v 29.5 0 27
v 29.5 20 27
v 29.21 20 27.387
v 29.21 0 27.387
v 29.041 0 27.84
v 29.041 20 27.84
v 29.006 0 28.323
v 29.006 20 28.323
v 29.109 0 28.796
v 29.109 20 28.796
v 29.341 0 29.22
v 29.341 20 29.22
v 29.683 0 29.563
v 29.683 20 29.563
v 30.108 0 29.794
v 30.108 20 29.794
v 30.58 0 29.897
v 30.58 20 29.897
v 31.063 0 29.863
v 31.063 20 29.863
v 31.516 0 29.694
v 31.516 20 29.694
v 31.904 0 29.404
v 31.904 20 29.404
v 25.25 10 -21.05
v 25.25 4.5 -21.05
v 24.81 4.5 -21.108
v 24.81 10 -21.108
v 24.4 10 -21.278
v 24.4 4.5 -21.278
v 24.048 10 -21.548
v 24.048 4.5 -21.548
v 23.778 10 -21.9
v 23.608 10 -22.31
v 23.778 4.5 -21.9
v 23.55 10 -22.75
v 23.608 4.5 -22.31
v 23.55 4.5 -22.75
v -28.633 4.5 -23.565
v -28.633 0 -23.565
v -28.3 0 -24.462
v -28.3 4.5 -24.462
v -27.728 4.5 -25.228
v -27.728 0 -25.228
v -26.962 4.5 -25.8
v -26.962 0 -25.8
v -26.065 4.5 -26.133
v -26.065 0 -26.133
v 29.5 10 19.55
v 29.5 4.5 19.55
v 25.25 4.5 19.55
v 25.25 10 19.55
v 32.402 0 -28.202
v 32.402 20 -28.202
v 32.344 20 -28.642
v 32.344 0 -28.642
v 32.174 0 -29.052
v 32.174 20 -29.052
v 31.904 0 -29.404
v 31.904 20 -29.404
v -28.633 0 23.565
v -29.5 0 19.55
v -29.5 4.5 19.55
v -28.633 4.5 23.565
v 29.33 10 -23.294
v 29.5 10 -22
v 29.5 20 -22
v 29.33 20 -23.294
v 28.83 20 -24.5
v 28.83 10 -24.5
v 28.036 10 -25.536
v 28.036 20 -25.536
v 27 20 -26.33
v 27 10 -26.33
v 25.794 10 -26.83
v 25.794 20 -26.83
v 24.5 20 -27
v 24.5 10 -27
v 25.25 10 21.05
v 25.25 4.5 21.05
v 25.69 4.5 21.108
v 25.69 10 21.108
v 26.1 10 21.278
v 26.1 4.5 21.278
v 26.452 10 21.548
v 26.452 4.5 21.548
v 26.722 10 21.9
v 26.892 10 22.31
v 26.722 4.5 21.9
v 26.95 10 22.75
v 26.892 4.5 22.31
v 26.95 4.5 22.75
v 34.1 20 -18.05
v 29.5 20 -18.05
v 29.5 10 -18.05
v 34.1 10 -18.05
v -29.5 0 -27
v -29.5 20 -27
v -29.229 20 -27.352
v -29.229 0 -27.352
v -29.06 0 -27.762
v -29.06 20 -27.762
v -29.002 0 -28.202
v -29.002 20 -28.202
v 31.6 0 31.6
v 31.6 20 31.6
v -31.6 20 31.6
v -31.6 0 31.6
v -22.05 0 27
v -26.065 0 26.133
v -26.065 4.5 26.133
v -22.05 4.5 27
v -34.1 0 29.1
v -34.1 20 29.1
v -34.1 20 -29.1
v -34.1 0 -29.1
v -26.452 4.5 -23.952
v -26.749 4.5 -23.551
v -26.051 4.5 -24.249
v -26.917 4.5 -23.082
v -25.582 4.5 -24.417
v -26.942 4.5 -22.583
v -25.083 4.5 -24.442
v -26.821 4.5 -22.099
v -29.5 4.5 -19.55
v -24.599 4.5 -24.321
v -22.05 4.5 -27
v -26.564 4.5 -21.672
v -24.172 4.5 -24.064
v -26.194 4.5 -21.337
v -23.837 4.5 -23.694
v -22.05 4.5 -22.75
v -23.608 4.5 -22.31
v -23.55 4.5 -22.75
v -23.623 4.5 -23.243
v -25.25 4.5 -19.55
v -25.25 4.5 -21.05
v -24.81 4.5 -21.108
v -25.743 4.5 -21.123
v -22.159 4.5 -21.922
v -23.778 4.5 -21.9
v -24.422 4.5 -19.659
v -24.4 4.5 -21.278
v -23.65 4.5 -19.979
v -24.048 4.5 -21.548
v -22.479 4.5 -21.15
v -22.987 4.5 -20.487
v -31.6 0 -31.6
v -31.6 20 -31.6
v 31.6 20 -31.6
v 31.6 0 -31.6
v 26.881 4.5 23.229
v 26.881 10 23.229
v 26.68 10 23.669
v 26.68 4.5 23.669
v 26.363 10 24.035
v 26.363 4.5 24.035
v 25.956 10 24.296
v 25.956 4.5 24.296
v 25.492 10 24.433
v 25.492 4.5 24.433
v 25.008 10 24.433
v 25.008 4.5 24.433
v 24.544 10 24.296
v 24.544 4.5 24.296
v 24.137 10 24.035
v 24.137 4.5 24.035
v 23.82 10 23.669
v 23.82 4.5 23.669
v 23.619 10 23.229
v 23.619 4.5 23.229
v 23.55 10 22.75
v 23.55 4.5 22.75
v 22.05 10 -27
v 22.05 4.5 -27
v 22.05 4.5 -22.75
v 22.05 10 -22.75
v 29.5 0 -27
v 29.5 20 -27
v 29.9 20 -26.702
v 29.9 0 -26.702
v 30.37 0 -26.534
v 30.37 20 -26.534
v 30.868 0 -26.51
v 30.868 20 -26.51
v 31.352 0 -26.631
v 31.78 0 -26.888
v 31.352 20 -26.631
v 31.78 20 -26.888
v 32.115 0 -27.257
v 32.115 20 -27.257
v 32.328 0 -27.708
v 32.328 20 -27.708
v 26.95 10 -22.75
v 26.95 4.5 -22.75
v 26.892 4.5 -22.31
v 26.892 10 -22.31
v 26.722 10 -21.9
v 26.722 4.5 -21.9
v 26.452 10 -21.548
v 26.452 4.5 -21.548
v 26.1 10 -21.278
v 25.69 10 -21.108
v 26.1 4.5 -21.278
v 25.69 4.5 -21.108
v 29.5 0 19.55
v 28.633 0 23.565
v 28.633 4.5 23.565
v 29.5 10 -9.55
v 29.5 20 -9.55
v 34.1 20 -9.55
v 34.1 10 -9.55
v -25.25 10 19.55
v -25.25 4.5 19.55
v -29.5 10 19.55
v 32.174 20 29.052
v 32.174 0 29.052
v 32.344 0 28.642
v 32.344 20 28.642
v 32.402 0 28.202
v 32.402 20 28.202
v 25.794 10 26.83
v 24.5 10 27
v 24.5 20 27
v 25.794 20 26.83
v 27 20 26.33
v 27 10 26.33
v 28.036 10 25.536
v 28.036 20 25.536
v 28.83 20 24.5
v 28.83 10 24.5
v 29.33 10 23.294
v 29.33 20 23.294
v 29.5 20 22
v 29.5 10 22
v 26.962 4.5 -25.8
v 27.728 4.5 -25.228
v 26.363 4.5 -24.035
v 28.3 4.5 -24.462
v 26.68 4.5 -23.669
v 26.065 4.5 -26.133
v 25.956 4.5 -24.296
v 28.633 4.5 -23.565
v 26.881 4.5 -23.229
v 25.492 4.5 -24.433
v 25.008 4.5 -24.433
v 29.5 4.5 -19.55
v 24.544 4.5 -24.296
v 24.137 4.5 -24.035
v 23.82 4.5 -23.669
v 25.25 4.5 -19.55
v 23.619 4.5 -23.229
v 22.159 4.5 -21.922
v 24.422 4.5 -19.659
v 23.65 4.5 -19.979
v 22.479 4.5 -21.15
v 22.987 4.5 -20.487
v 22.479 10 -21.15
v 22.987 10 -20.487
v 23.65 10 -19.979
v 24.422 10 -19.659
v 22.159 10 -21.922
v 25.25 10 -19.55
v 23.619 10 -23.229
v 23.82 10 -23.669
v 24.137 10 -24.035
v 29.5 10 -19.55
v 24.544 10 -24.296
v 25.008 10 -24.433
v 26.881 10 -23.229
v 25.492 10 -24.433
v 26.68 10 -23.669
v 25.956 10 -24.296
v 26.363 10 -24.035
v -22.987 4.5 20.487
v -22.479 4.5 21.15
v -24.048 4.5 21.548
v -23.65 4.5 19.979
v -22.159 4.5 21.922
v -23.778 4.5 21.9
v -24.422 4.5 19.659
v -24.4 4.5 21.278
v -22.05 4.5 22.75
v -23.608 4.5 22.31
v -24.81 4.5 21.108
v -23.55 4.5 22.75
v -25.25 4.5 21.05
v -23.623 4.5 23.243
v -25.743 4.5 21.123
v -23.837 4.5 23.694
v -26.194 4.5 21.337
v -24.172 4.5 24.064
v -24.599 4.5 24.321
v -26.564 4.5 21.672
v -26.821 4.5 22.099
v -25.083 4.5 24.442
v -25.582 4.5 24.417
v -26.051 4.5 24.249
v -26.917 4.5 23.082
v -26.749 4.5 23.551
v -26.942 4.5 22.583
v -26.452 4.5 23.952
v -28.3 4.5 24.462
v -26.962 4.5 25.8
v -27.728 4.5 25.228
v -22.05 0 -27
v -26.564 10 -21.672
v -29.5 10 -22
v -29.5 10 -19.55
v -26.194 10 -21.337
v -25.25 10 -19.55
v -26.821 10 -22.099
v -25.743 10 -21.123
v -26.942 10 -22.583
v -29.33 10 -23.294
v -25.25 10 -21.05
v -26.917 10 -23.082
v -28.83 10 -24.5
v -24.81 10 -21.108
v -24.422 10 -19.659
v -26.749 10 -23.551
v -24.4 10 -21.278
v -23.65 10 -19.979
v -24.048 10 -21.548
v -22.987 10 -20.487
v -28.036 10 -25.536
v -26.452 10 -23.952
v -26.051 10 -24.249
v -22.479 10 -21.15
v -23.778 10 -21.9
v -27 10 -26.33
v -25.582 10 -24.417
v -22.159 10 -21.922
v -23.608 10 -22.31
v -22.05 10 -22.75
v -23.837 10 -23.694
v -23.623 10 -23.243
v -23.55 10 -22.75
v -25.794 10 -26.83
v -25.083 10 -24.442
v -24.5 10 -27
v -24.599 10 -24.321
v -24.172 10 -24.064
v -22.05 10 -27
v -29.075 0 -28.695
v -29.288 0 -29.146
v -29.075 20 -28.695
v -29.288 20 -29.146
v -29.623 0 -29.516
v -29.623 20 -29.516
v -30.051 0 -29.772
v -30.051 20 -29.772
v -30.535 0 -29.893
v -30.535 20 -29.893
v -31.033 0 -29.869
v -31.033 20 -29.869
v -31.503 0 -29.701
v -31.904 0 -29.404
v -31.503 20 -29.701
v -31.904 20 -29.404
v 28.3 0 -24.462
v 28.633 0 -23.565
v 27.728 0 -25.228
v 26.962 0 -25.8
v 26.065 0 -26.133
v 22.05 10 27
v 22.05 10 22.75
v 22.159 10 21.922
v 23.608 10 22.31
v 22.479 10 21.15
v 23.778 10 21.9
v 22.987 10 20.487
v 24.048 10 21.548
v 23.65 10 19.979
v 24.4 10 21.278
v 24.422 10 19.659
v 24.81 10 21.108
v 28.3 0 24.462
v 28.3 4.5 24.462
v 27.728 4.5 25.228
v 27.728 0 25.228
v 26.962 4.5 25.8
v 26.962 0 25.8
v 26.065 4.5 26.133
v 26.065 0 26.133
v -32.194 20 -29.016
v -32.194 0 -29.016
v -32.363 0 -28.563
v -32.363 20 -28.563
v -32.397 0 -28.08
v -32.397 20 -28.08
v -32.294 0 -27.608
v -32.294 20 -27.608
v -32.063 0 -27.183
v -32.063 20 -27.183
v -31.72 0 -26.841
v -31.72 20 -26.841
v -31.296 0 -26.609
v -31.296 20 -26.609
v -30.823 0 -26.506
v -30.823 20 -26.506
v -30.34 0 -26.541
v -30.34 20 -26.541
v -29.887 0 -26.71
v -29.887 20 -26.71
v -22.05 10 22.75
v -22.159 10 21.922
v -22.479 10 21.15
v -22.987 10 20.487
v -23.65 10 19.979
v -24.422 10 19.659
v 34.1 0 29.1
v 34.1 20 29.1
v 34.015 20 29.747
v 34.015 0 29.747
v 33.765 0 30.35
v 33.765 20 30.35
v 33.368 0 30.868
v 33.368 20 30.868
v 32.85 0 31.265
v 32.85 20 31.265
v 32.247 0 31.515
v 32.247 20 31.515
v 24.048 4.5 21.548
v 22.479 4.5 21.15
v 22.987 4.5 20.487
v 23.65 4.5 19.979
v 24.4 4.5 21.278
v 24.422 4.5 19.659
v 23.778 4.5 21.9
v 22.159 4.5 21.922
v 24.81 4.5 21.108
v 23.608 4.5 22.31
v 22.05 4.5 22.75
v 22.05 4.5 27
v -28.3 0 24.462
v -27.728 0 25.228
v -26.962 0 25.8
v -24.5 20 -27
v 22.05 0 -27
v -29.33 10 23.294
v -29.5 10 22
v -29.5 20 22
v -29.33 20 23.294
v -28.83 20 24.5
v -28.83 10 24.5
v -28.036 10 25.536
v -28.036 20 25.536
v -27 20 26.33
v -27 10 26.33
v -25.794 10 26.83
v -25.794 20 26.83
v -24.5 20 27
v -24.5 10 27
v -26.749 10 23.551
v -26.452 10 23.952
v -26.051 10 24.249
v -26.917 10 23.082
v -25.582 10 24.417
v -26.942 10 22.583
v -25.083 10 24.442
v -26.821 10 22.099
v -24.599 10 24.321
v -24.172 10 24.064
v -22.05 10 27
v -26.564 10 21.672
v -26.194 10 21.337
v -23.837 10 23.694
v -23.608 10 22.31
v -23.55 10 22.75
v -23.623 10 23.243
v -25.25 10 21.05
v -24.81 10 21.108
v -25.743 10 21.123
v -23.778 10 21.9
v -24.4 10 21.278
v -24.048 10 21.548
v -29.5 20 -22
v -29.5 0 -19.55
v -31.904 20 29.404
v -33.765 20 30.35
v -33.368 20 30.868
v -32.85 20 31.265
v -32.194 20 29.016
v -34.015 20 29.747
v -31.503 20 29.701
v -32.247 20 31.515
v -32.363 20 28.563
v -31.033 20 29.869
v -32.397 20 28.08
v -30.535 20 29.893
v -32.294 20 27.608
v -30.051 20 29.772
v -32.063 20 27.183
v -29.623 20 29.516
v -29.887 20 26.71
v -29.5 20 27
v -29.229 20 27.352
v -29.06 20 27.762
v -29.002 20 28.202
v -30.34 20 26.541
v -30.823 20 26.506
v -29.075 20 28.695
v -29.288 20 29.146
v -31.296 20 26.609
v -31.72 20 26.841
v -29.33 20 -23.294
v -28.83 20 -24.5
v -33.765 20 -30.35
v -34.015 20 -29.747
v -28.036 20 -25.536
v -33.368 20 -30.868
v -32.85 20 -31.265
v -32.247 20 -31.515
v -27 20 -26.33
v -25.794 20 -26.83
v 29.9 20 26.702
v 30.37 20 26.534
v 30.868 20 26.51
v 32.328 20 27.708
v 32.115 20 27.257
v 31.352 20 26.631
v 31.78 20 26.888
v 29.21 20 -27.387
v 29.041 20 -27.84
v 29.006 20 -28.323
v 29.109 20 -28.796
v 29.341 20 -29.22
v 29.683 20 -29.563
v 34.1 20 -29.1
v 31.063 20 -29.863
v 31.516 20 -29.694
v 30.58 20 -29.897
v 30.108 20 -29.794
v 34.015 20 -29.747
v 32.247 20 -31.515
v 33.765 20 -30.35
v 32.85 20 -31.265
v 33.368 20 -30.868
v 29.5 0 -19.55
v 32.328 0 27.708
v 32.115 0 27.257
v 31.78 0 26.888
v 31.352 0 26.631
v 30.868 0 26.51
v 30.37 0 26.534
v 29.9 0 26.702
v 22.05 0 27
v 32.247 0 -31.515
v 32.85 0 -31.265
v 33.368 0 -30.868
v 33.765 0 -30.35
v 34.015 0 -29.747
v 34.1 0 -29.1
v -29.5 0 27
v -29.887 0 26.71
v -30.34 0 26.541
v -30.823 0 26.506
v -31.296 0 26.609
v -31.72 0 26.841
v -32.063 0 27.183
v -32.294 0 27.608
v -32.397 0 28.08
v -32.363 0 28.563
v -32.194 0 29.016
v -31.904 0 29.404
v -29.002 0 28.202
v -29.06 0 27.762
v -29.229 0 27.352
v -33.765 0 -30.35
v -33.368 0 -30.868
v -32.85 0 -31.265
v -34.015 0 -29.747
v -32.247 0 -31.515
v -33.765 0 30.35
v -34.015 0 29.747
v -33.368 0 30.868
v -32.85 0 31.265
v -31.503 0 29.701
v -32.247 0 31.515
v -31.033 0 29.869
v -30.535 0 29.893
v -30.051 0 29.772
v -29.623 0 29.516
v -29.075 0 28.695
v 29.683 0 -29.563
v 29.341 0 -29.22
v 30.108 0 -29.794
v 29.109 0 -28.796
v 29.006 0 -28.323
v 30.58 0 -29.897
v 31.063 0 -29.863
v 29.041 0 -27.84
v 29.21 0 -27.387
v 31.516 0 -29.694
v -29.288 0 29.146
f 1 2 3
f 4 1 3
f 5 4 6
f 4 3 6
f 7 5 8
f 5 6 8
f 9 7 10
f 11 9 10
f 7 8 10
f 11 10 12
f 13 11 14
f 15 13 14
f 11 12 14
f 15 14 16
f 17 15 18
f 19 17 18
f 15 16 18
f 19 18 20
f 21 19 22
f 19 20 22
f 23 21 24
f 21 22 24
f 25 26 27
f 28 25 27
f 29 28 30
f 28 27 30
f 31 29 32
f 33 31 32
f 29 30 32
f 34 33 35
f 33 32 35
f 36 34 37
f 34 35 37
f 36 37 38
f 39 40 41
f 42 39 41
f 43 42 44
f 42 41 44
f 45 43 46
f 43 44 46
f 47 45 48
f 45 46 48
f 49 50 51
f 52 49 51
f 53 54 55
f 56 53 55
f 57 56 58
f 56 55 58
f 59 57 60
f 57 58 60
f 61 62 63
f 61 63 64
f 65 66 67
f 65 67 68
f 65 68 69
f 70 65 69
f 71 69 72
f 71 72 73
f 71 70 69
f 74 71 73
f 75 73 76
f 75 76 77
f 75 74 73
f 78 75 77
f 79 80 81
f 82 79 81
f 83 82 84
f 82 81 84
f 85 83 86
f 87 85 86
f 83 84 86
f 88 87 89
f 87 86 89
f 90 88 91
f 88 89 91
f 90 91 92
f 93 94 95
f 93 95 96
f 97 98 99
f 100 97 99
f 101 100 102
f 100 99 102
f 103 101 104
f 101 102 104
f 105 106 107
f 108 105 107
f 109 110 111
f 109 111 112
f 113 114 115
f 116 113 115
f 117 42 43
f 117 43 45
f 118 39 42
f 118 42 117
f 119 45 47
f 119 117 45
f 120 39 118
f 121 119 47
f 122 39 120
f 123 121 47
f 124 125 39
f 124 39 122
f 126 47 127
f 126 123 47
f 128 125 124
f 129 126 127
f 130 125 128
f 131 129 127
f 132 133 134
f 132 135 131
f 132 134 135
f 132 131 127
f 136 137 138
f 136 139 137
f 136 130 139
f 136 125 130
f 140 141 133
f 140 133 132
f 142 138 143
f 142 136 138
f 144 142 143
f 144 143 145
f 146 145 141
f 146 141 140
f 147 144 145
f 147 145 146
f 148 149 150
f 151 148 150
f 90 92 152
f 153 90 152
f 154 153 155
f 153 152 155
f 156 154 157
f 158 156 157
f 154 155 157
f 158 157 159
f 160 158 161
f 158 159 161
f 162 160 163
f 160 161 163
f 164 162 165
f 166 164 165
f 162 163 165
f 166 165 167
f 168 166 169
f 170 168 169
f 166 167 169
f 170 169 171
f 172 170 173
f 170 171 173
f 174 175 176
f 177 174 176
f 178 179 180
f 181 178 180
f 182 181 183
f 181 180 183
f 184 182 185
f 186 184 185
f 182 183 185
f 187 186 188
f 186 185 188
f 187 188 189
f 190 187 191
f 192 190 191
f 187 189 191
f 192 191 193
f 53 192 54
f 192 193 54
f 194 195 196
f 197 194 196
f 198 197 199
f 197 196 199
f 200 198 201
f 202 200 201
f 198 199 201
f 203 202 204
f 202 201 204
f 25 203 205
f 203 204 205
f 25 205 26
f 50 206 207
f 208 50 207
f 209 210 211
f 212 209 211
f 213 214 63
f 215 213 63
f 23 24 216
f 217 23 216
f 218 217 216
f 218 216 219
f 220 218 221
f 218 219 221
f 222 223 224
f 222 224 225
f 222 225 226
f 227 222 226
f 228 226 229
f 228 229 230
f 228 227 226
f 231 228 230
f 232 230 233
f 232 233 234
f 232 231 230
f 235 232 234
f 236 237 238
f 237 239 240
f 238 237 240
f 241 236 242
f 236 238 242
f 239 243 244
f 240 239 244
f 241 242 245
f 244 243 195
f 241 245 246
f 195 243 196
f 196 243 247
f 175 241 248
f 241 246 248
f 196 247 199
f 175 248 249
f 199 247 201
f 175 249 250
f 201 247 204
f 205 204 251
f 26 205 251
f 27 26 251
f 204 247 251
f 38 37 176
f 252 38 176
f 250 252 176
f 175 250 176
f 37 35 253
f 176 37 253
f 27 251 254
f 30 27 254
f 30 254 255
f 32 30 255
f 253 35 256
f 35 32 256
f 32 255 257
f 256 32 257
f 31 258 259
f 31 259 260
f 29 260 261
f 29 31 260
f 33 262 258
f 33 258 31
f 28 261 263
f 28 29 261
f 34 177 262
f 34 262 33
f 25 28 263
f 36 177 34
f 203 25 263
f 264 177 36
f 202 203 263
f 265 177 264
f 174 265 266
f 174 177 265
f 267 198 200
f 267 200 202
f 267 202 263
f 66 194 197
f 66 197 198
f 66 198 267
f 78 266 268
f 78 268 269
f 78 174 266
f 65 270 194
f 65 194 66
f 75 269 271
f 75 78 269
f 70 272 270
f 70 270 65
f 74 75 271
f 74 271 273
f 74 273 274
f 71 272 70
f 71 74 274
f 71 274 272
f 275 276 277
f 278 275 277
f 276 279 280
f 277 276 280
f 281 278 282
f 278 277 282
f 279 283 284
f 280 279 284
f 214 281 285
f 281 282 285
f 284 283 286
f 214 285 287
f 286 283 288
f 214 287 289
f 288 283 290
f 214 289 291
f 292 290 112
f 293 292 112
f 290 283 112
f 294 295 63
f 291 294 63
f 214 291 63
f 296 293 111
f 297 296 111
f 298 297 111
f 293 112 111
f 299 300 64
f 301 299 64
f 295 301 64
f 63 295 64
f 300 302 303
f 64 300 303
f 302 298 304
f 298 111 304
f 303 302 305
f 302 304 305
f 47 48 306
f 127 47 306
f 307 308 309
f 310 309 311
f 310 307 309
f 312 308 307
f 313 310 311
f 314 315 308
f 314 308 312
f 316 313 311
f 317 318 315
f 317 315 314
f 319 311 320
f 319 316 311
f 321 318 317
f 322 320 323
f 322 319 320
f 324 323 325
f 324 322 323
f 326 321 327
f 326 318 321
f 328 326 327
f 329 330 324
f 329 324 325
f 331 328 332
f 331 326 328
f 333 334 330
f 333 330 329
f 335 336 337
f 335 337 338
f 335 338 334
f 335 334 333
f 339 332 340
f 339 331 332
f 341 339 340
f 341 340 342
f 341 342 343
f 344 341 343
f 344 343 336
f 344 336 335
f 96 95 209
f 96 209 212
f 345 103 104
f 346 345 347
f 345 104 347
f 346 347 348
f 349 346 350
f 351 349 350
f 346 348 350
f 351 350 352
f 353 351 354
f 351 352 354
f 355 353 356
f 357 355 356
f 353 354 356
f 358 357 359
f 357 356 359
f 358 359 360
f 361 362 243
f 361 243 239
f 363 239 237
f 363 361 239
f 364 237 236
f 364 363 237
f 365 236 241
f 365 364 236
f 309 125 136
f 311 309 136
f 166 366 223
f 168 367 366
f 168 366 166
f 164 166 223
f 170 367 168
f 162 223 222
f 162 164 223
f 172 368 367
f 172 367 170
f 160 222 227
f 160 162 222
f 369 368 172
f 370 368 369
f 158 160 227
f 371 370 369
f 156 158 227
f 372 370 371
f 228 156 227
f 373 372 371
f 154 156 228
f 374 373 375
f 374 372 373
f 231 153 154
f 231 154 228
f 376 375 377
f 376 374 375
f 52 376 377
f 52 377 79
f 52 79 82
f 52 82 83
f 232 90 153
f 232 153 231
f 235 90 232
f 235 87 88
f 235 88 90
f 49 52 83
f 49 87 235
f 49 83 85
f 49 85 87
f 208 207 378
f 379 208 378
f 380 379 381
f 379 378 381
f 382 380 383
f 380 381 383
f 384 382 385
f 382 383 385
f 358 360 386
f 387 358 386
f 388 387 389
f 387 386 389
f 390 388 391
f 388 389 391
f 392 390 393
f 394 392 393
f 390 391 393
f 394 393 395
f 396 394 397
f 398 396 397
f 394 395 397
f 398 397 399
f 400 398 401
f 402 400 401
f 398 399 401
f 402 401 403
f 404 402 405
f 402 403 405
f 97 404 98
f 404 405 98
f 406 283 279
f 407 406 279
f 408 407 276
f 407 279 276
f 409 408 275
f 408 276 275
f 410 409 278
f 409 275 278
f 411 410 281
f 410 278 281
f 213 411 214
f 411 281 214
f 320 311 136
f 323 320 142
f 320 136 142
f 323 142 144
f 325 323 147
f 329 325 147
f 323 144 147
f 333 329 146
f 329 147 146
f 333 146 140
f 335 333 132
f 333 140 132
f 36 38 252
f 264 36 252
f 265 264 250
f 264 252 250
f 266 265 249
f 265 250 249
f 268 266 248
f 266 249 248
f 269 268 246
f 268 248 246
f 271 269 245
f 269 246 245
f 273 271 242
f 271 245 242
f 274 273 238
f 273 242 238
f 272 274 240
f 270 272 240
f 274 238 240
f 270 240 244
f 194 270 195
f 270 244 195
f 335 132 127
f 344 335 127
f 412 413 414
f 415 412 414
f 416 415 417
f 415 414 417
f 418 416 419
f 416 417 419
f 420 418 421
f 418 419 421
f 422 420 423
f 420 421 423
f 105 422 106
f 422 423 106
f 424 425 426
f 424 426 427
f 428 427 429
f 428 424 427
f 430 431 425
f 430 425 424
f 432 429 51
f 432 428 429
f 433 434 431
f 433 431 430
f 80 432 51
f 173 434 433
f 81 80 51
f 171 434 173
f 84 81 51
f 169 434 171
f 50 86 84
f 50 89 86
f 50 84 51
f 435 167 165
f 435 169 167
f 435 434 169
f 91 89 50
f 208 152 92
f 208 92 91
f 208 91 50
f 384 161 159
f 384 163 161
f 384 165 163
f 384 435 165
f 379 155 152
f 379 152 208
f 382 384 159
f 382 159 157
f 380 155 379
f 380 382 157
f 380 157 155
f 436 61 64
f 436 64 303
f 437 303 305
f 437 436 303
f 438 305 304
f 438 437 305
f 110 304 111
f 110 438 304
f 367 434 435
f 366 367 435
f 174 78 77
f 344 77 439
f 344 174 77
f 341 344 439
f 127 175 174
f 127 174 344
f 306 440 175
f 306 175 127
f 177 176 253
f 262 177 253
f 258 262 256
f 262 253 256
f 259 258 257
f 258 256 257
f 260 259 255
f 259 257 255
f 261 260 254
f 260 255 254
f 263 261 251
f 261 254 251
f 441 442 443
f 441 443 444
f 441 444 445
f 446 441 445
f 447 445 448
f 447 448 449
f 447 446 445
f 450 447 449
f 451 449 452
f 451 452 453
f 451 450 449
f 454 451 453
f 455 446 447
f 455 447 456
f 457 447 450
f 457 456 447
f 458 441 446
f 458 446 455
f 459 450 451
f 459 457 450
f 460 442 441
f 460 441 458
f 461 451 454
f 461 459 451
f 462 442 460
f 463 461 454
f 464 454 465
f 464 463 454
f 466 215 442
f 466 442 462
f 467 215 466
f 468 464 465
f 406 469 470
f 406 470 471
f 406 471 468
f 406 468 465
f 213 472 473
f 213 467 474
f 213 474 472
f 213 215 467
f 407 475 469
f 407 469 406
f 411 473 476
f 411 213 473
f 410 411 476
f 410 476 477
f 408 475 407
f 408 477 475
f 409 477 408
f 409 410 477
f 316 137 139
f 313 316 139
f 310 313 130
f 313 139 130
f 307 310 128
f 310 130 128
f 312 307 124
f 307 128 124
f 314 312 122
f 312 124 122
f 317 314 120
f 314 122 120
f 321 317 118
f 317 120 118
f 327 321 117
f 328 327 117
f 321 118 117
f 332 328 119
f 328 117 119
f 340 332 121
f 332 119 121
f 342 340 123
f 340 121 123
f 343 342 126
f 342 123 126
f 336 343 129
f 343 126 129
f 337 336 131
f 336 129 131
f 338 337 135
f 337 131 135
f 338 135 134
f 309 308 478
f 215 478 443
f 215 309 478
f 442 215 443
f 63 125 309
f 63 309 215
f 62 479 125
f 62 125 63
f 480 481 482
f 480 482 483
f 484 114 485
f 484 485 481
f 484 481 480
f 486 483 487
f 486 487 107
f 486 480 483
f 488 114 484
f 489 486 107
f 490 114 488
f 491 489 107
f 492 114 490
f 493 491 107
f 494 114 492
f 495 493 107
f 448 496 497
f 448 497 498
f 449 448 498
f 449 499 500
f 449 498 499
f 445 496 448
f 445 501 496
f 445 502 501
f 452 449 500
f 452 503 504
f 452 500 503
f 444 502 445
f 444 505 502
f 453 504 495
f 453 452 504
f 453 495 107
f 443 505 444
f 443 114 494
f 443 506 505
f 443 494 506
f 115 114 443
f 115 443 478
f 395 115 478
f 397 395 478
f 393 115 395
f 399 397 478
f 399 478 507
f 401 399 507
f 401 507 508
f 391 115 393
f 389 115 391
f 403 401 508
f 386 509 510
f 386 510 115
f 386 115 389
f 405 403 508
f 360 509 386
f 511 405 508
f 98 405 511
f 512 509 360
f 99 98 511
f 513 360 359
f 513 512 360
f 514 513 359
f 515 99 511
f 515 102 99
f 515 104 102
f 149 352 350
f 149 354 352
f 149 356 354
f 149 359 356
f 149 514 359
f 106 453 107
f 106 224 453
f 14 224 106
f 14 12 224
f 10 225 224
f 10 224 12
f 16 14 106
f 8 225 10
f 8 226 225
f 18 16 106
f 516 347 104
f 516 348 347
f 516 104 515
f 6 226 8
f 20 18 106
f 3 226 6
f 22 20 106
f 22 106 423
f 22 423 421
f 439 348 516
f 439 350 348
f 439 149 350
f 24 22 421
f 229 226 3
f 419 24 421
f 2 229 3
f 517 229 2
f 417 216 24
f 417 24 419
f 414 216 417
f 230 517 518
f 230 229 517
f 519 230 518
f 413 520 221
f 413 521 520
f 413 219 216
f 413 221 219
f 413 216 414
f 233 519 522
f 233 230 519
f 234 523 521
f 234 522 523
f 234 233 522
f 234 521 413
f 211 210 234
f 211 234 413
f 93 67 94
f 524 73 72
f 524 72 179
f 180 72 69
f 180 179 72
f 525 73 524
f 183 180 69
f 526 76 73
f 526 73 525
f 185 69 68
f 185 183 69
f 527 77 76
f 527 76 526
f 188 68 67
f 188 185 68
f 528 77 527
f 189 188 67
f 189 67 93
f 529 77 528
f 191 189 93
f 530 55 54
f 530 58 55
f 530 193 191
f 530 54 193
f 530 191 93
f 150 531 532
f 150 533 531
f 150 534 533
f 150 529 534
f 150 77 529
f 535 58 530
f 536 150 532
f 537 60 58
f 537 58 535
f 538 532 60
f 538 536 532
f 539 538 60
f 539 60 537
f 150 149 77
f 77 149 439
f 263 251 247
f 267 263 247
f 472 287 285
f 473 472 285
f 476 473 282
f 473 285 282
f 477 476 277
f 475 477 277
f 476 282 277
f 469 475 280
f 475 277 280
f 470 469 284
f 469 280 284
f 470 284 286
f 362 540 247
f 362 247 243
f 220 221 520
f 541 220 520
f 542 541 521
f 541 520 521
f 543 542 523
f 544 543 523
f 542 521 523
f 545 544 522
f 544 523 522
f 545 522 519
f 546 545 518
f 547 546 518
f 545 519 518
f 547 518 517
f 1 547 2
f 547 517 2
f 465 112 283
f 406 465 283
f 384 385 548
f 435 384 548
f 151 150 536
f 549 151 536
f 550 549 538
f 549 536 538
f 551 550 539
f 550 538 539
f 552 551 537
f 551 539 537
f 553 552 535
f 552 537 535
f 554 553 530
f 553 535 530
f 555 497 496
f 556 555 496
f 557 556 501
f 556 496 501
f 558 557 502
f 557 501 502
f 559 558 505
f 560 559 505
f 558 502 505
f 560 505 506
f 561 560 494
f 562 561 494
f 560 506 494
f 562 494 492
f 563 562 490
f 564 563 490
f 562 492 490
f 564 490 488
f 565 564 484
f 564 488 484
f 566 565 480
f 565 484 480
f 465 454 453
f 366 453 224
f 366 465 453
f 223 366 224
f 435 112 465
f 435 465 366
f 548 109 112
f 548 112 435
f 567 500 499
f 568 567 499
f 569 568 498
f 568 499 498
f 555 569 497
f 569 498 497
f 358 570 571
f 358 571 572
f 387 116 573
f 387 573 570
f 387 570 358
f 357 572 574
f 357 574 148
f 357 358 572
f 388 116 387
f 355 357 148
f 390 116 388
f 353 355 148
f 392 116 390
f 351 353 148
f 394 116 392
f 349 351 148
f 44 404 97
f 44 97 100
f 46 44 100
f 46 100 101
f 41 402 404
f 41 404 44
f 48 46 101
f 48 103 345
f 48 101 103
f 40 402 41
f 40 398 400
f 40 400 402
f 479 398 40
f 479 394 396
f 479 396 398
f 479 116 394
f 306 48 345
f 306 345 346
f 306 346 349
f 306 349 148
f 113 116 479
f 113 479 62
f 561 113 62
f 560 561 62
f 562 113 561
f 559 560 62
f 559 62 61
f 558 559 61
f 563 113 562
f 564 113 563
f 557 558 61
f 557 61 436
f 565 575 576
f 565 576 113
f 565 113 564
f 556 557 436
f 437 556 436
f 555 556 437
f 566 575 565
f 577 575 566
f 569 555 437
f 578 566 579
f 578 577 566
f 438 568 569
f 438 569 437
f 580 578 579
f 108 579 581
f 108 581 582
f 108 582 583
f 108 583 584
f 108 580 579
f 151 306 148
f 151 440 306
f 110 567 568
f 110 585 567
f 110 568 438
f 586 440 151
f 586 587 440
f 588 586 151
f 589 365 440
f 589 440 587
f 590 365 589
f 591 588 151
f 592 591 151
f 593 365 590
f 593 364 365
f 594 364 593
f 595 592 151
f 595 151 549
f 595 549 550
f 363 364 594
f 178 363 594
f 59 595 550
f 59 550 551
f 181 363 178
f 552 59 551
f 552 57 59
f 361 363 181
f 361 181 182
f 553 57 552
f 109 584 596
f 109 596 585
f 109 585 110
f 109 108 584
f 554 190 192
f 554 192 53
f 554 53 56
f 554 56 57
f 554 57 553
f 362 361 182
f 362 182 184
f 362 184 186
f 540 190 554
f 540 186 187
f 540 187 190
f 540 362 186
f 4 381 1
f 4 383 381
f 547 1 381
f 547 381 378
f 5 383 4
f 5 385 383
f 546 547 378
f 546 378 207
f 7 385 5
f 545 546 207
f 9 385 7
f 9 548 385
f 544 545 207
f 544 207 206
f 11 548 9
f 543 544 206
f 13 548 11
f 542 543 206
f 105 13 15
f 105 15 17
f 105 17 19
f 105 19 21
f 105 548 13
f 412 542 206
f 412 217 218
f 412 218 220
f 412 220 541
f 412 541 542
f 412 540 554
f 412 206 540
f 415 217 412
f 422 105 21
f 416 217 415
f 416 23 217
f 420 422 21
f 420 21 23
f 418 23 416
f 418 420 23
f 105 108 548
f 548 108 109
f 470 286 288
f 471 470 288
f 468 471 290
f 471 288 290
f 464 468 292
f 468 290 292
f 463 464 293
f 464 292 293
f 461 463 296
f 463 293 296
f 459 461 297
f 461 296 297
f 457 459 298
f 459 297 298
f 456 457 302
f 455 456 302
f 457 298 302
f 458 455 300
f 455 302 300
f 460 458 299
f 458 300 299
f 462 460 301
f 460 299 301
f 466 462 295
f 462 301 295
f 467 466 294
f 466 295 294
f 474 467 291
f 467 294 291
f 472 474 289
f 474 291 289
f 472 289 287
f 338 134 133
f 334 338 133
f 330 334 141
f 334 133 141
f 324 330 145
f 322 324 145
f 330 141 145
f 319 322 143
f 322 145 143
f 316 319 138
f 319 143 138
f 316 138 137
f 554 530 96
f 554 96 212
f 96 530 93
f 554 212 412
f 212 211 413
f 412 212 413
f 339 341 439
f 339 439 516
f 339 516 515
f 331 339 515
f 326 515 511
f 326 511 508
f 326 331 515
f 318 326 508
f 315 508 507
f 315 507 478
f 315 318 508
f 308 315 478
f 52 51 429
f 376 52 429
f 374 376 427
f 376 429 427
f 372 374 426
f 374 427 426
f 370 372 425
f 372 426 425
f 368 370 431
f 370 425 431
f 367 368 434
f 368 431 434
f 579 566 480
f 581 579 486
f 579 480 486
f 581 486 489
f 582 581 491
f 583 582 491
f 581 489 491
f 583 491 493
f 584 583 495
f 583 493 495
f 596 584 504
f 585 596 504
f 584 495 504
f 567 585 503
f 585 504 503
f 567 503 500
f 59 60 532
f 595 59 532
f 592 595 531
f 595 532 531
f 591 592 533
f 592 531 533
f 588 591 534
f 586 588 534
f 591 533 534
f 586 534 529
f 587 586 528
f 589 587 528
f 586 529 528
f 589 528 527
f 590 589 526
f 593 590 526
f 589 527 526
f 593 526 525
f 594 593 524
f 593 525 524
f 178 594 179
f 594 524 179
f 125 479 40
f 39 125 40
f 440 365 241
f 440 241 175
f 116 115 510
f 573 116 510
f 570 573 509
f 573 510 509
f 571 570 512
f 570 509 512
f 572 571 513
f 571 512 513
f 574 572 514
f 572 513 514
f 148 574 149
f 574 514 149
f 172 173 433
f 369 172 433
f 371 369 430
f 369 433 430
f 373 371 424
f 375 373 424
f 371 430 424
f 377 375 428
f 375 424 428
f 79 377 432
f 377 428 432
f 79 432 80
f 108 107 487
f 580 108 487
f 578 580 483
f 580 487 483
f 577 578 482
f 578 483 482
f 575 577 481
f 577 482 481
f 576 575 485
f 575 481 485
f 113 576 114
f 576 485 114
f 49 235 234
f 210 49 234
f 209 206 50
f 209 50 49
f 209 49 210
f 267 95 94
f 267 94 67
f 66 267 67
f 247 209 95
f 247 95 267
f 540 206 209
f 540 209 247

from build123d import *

# Parameters (mm, degrees)
EXTRUDE_2_DEPTH     = 20
EXTRUDE_3_DEPTH     = 4
EXTRUDE_4_DEPTH     = 10
CUT_EXTRUDE_1_DEPTH = 25
SKETCH_5_W          = 4.6
SKETCH_5_H          = 8.5
CUT_EXTRUDE_2_DEPTH = 10
CUT_EXTRUDE_3_DEPTH = 4
SKETCH_7_R          = 1.7
CUT_EXTRUDE_4_DEPTH = 4.5


with BuildPart() as part:
    # ｽｹｯﾁ1 → ﾎﾞｽ - 押し出し2 (new body)
    with BuildSketch(Plane(origin=(0, 0, 0), x_dir=(1, 0, 0), z_dir=(0, 1, 0))):
        with BuildLine():
            Line((31.6, 31.6), (-31.6, 31.6))
            ThreePointArc((-31.6, 31.6), (-33.367766953, 30.867766953), (-34.1, 29.1))
            Line((-34.1, 29.1), (-34.1, -29.1))
            ThreePointArc((-34.1, -29.1), (-33.367766953, -30.867766953), (-31.6, -31.6))
            Line((-31.6, -31.6), (31.6, -31.6))
            ThreePointArc((31.6, -31.6), (33.367766953, -30.867766953), (34.1, -29.1))
            Line((34.1, -29.1), (34.1, 29.1))
            ThreePointArc((34.1, 29.1), (33.367766953, 30.867766953), (31.6, 31.6))
        make_face()
        with BuildLine():
            Line((24.5, 27), (-24.5, 27))
            ThreePointArc((-24.5, 27), (-28.035533906, 25.535533906), (-29.5, 22))
            Line((-29.5, 22), (-29.5, -22))
            ThreePointArc((-29.5, -22), (-28.035533906, -25.535533906), (-24.5, -27))
            Line((-24.5, -27), (24.5, -27))
            ThreePointArc((24.5, -27), (28.035533906, -25.535533906), (29.5, -22))
            Line((29.5, -22), (29.5, 22))
            ThreePointArc((29.5, 22), (28.035533906, 25.535533906), (24.5, 27))
        make_face(mode=Mode.SUBTRACT)
    extrude(amount=EXTRUDE_2_DEPTH)

    # ｽｹｯﾁ2 → ﾎﾞｽ - 押し出し3 (add)
    with BuildSketch(Plane.XZ):
        with BuildLine():
            Line((34.1, -29.1), (34.1, 29.1))
            ThreePointArc((34.1, 29.1), (33.367766953, 30.867766953), (31.6, 31.6))
            Line((31.6, 31.6), (-31.6, 31.6))
            ThreePointArc((-31.6, 31.6), (-33.367766953, 30.867766953), (-34.1, 29.1))
            Line((-34.1, 29.1), (-34.1, -29.1))
            ThreePointArc((-34.1, -29.1), (-33.367766953, -30.867766953), (-31.6, -31.6))
            Line((-31.6, -31.6), (31.6, -31.6))
            ThreePointArc((31.6, -31.6), (33.367766953, -30.867766953), (34.1, -29.1))
        make_face()
    extrude(amount=EXTRUDE_3_DEPTH)

    # ｽｹｯﾁ3 → ﾎﾞｽ - 押し出し4 (add)
    with BuildSketch(Plane(origin=(0, 0, 0), x_dir=(1, 0, 0), z_dir=(0, 1, 0))):
        with BuildLine():
            ThreePointArc((22.05, 22.75), (22.9872583, 20.4872583), (25.25, 19.55))
            Line((25.25, 19.55), (25.25, 21.05))
            ThreePointArc((25.25, 21.05), (24.047918472, 21.547918472), (23.55, 22.75))
            Line((23.55, 22.75), (22.05, 22.75))
        make_face()
        with BuildLine():
            Line((25.25, 21.05), (25.25, 19.55))
            ThreePointArc((25.25, 19.55), (27.5127417, 20.4872583), (28.45, 22.75))
            ThreePointArc((28.45, 22.75), (25.25, 25.95), (22.05, 22.75))
            Line((22.05, 22.75), (23.55, 22.75))
            ThreePointArc((23.55, 22.75), (25.25, 24.45), (26.95, 22.75))
            ThreePointArc((26.95, 22.75), (26.452081528, 21.547918472), (25.25, 21.05))
        make_face()
        with BuildLine():
            ThreePointArc((-22.05, 22.75), (-27.5127417, 25.0127417), (-25.25, 19.55))
            Line((-25.25, 19.55), (-25.25, 21.05))
            ThreePointArc((-25.25, 21.05), (-26.452081528, 23.952081528), (-23.55, 22.75))
            Line((-23.55, 22.75), (-22.05, 22.75))
        make_face()
        with BuildLine():
            Line((-25.25, 21.05), (-25.25, 19.55))
            ThreePointArc((-25.25, 19.55), (-22.9872583, 20.4872583), (-22.05, 22.75))
            Line((-22.05, 22.75), (-23.55, 22.75))
            ThreePointArc((-23.55, 22.75), (-24.047918472, 21.547918472), (-25.25, 21.05))
        make_face()
        with BuildLine():
            ThreePointArc((-25.25, -21.05), (-24.047918472, -21.547918472), (-23.55, -22.75))
            Line((-23.55, -22.75), (-22.05, -22.75))
            ThreePointArc((-22.05, -22.75), (-22.9872583, -20.4872583), (-25.25, -19.55))
            Line((-25.25, -19.55), (-25.25, -21.05))
        make_face()
        with BuildLine():
            Line((-22.05, -22.75), (-23.55, -22.75))
            ThreePointArc((-23.55, -22.75), (-26.452081528, -23.952081528), (-25.25, -21.05))
            Line((-25.25, -21.05), (-25.25, -19.55))
            ThreePointArc((-25.25, -19.55), (-27.5127417, -25.0127417), (-22.05, -22.75))
        make_face()
        with BuildLine():
            ThreePointArc((25.25, -19.55), (22.987258299, -20.487258301), (22.05, -22.750000003))
            Line((22.05, -22.75), (23.55, -22.75))
            ThreePointArc((23.55, -22.75), (24.047918472, -21.547918472), (25.25, -21.05))
            Line((25.25, -21.05), (25.25, -19.55))
        make_face()
        with BuildLine():
            Line((23.55, -22.75), (22.05, -22.75))
            ThreePointArc((22.05, -22.750000003), (25.250000002, -25.95), (28.45, -22.75))
            ThreePointArc((28.45, -22.75), (27.5127417, -20.4872583), (25.25, -19.55))
            Line((25.25, -19.55), (25.25, -21.05))
            ThreePointArc((25.25, -21.05), (26.452081528, -21.547918472), (26.95, -22.75))
            ThreePointArc((26.95, -22.75), (25.25, -24.45), (23.55, -22.75))
        make_face()
        with BuildLine():
            ThreePointArc((28.45, -22.75), (25.250000002, -25.95), (22.05, -22.750000003))
            Line((22.05, -22.750000003), (22.05, -27))
            Line((22.05, -27), (24.5, -27))
            ThreePointArc((24.5, -27), (28.035533906, -25.535533906), (29.5, -22))
            Line((29.5, -22), (29.5, -19.55))
            Line((29.5, -19.55), (25.25, -19.55))
            ThreePointArc((25.25, -19.55), (27.5127417, -20.4872583), (28.45, -22.75))
        make_face()
        with BuildLine():
            ThreePointArc((28.45, 22.75), (27.5127417, 20.4872583), (25.25, 19.55))
            Line((25.25, 19.55), (29.5, 19.55))
            Line((29.5, 19.55), (29.5, 22))
            ThreePointArc((29.5, 22), (28.035533906, 25.535533906), (24.5, 27))
            Line((24.5, 27), (22.05, 27))
            Line((22.05, 27), (22.05, 22.75))
            ThreePointArc((22.05, 22.75), (25.25, 25.95), (28.45, 22.75))
        make_face()
        with BuildLine():
            Line((-22.05, -27), (-22.05, -22.75))
            ThreePointArc((-22.05, -22.75), (-27.5127417, -25.0127417), (-25.25, -19.55))
            Line((-25.25, -19.55), (-29.5, -19.55))
            Line((-29.5, -19.55), (-29.5, -22))
            ThreePointArc((-29.5, -22), (-28.035533906, -25.535533906), (-24.5, -27))
            Line((-24.5, -27), (-22.05, -27))
        make_face()
        with BuildLine():
            Line((-29.5, 19.55), (-25.25, 19.55))
            ThreePointArc((-25.25, 19.55), (-27.5127417, 25.0127417), (-22.05, 22.75))
            Line((-22.05, 22.75), (-22.05, 27))
            Line((-22.05, 27), (-24.5, 27))
            ThreePointArc((-24.5, 27), (-28.035533906, 25.535533906), (-29.5, 22))
            Line((-29.5, 22), (-29.5, 19.55))
        make_face()
    extrude(amount=EXTRUDE_4_DEPTH)

    # ｽｹｯﾁ4 → ｶｯﾄ - 押し出し1 (cut, through all)
    with BuildSketch(Plane(origin=(0, 20, 0), x_dir=(1, 0, 0), z_dir=(0, 1, 0))):
        with BuildLine():
            ThreePointArc((-29.499568901, -26.999568901), (-31.903731957, -26.999568901), (-31.903731957, -29.403731957))
            Line((-31.903731957, -29.403731957), (-29.499568901, -26.999568901))
        make_face()
        with BuildLine():
            Line((-29.499568901, -26.999568901), (-31.903731957, -29.403731957))
            ThreePointArc((-31.903731957, -29.403731957), (-30.051088594, -29.772245635), (-29.001650429, -28.201650429))
            ThreePointArc((-29.001650429, -28.201650429), (-29.131055224, -27.551088594), (-29.499568901, -26.999568901))
        make_face()
        with BuildLine():
            ThreePointArc((-31.903731957, 29.403731957), (-31.903731957, 26.999568901), (-29.499568901, 26.999568901))
            Line((-29.499568901, 26.999568901), (-31.903731957, 29.403731957))
        make_face()
        with BuildLine():
            Line((-31.903731957, 29.403731957), (-29.499568901, 26.999568901))
            ThreePointArc((-29.499568901, 26.999568901), (-29.131055224, 27.551088594), (-29.001650429, 28.201650429))
            ThreePointArc((-29.001650429, 28.201650429), (-30.051088594, 29.772245635), (-31.903731957, 29.403731957))
        make_face()
        with BuildLine():
            ThreePointArc((32.401650429, 28.201650429), (32.272245635, 28.852212264), (31.903731957, 29.403731957))
            Line((31.903731957, 29.403731957), (29.499568901, 26.999568901))
            ThreePointArc((29.499568901, 26.999568901), (31.352212264, 26.631055224), (32.401650429, 28.201650429))
        make_face()
        with BuildLine():
            Line((29.499568901, 26.999568901), (31.903731957, 29.403731957))
            ThreePointArc((31.903731957, 29.403731957), (29.499568901, 29.403731957), (29.499568901, 26.999568901))
        make_face()
        with BuildLine():
            ThreePointArc((32.401650429, -28.201650429), (31.352212264, -26.631055224), (29.499568901, -26.999568901))
            Line((29.499568901, -26.999568901), (31.903731957, -29.403731957))
            ThreePointArc((31.903731957, -29.403731957), (32.272245635, -28.852212264), (32.401650429, -28.201650429))
        make_face()
        with BuildLine():
            Line((31.903731957, -29.403731957), (29.499568901, -26.999568901))
            ThreePointArc((29.499568901, -26.999568901), (29.499568901, -29.403731957), (31.903731957, -29.403731957))
        make_face()
    extrude(amount=-CUT_EXTRUDE_1_DEPTH, mode=Mode.SUBTRACT)

    # ｽｹｯﾁ5 → ｶｯﾄ - 押し出し2 (cut)
    with BuildSketch(Plane(origin=(0, 20, 0), x_dir=(1, 0, 0), z_dir=(0, 1, 0))):
        with Locations((31.8, 13.8)):
            Rectangle(SKETCH_5_W, SKETCH_5_H)
    extrude(amount=-CUT_EXTRUDE_2_DEPTH, mode=Mode.SUBTRACT)

    # ｽｹｯﾁ6 → ｶｯﾄ - 押し出し3 (cut)
    with BuildSketch(Plane.XZ.offset(4)):
        with BuildLine():
            Line((34.1, -29.1), (34.1, 29.1))
            ThreePointArc((34.1, 29.1), (33.367766953, 30.867766953), (31.6, 31.6))
            Line((31.6, 31.6), (-31.6, 31.6))
            ThreePointArc((-31.6, 31.6), (-33.367766953, 30.867766953), (-34.1, 29.1))
            Line((-34.1, 29.1), (-34.1, -29.1))
            ThreePointArc((-34.1, -29.1), (-33.367766953, -30.867766953), (-31.6, -31.6))
            Line((-31.6, -31.6), (31.6, -31.6))
            ThreePointArc((31.6, -31.6), (33.367766953, -30.867766953), (34.1, -29.1))
        make_face()
    extrude(amount=-CUT_EXTRUDE_3_DEPTH, mode=Mode.SUBTRACT)

    # ｽｹｯﾁ7 → ｶｯﾄ - 押し出し4 (cut)
    with BuildSketch(Plane.XZ):
        with BuildLine():
            ThreePointArc((28.6333448, -23.565494429), (27.727552542, -25.227552542), (26.065494429, -26.1333448))
            Line((26.065494429, -26.1333448), (22.05, -27))
            Line((22.05, -27), (22.05, -22.75))
            ThreePointArc((22.05, -22.75), (22.9872583, -20.4872583), (25.25, -19.55))
            Line((25.25, -19.55), (29.5, -19.55))
            Line((29.5, -19.55), (28.6333448, -23.565494429))
        make_face()
        with Locations((25.25, -22.75)):
            Circle(SKETCH_7_R, mode=Mode.SUBTRACT)
        with BuildLine():
            Line((-29.5, -19.55), (-28.6333448, -23.565494429))
            ThreePointArc((-28.6333448, -23.565494429), (-27.727552542, -25.227552542), (-26.065494429, -26.1333448))
            Line((-26.065494429, -26.1333448), (-22.05, -27))
            Line((-22.05, -27), (-22.05, -22.75))
            ThreePointArc((-22.05, -22.75), (-22.9872583, -20.4872583), (-25.25, -19.55))
            Line((-25.25, -19.55), (-29.5, -19.55))
        make_face()
        with Locations((-25.25, -22.75)):
            Circle(SKETCH_7_R, mode=Mode.SUBTRACT)
        with BuildLine():
            ThreePointArc((-28.6333448, 23.565494429), (-27.727552542, 25.227552542), (-26.065494429, 26.1333448))
            Line((-26.065494429, 26.1333448), (-22.05, 27))
            Line((-22.05, 27), (-22.05, 22.75))
            ThreePointArc((-22.05, 22.75), (-22.9872583, 20.4872583), (-25.25, 19.55))
            Line((-25.25, 19.55), (-29.5, 19.55))
            Line((-29.5, 19.55), (-28.6333448, 23.565494429))
        make_face()
        with Locations((-25.25, 22.75)):
            Circle(SKETCH_7_R, mode=Mode.SUBTRACT)
        with BuildLine():
            Line((29.5, 19.55), (28.6333448, 23.565494429))
            ThreePointArc((28.6333448, 23.565494429), (27.727552542, 25.227552542), (26.065494429, 26.1333448))
            Line((26.065494429, 26.1333448), (22.05, 27))
            Line((22.05, 27), (22.05, 22.75))
            ThreePointArc((22.05, 22.75), (22.9872583, 20.4872583), (25.25, 19.55))
            Line((25.25, 19.55), (29.5, 19.55))
        make_face()
        with Locations((25.25, 22.75)):
            Circle(SKETCH_7_R, mode=Mode.SUBTRACT)
    extrude(amount=-CUT_EXTRUDE_4_DEPTH, mode=Mode.SUBTRACT)


solid = part.part
